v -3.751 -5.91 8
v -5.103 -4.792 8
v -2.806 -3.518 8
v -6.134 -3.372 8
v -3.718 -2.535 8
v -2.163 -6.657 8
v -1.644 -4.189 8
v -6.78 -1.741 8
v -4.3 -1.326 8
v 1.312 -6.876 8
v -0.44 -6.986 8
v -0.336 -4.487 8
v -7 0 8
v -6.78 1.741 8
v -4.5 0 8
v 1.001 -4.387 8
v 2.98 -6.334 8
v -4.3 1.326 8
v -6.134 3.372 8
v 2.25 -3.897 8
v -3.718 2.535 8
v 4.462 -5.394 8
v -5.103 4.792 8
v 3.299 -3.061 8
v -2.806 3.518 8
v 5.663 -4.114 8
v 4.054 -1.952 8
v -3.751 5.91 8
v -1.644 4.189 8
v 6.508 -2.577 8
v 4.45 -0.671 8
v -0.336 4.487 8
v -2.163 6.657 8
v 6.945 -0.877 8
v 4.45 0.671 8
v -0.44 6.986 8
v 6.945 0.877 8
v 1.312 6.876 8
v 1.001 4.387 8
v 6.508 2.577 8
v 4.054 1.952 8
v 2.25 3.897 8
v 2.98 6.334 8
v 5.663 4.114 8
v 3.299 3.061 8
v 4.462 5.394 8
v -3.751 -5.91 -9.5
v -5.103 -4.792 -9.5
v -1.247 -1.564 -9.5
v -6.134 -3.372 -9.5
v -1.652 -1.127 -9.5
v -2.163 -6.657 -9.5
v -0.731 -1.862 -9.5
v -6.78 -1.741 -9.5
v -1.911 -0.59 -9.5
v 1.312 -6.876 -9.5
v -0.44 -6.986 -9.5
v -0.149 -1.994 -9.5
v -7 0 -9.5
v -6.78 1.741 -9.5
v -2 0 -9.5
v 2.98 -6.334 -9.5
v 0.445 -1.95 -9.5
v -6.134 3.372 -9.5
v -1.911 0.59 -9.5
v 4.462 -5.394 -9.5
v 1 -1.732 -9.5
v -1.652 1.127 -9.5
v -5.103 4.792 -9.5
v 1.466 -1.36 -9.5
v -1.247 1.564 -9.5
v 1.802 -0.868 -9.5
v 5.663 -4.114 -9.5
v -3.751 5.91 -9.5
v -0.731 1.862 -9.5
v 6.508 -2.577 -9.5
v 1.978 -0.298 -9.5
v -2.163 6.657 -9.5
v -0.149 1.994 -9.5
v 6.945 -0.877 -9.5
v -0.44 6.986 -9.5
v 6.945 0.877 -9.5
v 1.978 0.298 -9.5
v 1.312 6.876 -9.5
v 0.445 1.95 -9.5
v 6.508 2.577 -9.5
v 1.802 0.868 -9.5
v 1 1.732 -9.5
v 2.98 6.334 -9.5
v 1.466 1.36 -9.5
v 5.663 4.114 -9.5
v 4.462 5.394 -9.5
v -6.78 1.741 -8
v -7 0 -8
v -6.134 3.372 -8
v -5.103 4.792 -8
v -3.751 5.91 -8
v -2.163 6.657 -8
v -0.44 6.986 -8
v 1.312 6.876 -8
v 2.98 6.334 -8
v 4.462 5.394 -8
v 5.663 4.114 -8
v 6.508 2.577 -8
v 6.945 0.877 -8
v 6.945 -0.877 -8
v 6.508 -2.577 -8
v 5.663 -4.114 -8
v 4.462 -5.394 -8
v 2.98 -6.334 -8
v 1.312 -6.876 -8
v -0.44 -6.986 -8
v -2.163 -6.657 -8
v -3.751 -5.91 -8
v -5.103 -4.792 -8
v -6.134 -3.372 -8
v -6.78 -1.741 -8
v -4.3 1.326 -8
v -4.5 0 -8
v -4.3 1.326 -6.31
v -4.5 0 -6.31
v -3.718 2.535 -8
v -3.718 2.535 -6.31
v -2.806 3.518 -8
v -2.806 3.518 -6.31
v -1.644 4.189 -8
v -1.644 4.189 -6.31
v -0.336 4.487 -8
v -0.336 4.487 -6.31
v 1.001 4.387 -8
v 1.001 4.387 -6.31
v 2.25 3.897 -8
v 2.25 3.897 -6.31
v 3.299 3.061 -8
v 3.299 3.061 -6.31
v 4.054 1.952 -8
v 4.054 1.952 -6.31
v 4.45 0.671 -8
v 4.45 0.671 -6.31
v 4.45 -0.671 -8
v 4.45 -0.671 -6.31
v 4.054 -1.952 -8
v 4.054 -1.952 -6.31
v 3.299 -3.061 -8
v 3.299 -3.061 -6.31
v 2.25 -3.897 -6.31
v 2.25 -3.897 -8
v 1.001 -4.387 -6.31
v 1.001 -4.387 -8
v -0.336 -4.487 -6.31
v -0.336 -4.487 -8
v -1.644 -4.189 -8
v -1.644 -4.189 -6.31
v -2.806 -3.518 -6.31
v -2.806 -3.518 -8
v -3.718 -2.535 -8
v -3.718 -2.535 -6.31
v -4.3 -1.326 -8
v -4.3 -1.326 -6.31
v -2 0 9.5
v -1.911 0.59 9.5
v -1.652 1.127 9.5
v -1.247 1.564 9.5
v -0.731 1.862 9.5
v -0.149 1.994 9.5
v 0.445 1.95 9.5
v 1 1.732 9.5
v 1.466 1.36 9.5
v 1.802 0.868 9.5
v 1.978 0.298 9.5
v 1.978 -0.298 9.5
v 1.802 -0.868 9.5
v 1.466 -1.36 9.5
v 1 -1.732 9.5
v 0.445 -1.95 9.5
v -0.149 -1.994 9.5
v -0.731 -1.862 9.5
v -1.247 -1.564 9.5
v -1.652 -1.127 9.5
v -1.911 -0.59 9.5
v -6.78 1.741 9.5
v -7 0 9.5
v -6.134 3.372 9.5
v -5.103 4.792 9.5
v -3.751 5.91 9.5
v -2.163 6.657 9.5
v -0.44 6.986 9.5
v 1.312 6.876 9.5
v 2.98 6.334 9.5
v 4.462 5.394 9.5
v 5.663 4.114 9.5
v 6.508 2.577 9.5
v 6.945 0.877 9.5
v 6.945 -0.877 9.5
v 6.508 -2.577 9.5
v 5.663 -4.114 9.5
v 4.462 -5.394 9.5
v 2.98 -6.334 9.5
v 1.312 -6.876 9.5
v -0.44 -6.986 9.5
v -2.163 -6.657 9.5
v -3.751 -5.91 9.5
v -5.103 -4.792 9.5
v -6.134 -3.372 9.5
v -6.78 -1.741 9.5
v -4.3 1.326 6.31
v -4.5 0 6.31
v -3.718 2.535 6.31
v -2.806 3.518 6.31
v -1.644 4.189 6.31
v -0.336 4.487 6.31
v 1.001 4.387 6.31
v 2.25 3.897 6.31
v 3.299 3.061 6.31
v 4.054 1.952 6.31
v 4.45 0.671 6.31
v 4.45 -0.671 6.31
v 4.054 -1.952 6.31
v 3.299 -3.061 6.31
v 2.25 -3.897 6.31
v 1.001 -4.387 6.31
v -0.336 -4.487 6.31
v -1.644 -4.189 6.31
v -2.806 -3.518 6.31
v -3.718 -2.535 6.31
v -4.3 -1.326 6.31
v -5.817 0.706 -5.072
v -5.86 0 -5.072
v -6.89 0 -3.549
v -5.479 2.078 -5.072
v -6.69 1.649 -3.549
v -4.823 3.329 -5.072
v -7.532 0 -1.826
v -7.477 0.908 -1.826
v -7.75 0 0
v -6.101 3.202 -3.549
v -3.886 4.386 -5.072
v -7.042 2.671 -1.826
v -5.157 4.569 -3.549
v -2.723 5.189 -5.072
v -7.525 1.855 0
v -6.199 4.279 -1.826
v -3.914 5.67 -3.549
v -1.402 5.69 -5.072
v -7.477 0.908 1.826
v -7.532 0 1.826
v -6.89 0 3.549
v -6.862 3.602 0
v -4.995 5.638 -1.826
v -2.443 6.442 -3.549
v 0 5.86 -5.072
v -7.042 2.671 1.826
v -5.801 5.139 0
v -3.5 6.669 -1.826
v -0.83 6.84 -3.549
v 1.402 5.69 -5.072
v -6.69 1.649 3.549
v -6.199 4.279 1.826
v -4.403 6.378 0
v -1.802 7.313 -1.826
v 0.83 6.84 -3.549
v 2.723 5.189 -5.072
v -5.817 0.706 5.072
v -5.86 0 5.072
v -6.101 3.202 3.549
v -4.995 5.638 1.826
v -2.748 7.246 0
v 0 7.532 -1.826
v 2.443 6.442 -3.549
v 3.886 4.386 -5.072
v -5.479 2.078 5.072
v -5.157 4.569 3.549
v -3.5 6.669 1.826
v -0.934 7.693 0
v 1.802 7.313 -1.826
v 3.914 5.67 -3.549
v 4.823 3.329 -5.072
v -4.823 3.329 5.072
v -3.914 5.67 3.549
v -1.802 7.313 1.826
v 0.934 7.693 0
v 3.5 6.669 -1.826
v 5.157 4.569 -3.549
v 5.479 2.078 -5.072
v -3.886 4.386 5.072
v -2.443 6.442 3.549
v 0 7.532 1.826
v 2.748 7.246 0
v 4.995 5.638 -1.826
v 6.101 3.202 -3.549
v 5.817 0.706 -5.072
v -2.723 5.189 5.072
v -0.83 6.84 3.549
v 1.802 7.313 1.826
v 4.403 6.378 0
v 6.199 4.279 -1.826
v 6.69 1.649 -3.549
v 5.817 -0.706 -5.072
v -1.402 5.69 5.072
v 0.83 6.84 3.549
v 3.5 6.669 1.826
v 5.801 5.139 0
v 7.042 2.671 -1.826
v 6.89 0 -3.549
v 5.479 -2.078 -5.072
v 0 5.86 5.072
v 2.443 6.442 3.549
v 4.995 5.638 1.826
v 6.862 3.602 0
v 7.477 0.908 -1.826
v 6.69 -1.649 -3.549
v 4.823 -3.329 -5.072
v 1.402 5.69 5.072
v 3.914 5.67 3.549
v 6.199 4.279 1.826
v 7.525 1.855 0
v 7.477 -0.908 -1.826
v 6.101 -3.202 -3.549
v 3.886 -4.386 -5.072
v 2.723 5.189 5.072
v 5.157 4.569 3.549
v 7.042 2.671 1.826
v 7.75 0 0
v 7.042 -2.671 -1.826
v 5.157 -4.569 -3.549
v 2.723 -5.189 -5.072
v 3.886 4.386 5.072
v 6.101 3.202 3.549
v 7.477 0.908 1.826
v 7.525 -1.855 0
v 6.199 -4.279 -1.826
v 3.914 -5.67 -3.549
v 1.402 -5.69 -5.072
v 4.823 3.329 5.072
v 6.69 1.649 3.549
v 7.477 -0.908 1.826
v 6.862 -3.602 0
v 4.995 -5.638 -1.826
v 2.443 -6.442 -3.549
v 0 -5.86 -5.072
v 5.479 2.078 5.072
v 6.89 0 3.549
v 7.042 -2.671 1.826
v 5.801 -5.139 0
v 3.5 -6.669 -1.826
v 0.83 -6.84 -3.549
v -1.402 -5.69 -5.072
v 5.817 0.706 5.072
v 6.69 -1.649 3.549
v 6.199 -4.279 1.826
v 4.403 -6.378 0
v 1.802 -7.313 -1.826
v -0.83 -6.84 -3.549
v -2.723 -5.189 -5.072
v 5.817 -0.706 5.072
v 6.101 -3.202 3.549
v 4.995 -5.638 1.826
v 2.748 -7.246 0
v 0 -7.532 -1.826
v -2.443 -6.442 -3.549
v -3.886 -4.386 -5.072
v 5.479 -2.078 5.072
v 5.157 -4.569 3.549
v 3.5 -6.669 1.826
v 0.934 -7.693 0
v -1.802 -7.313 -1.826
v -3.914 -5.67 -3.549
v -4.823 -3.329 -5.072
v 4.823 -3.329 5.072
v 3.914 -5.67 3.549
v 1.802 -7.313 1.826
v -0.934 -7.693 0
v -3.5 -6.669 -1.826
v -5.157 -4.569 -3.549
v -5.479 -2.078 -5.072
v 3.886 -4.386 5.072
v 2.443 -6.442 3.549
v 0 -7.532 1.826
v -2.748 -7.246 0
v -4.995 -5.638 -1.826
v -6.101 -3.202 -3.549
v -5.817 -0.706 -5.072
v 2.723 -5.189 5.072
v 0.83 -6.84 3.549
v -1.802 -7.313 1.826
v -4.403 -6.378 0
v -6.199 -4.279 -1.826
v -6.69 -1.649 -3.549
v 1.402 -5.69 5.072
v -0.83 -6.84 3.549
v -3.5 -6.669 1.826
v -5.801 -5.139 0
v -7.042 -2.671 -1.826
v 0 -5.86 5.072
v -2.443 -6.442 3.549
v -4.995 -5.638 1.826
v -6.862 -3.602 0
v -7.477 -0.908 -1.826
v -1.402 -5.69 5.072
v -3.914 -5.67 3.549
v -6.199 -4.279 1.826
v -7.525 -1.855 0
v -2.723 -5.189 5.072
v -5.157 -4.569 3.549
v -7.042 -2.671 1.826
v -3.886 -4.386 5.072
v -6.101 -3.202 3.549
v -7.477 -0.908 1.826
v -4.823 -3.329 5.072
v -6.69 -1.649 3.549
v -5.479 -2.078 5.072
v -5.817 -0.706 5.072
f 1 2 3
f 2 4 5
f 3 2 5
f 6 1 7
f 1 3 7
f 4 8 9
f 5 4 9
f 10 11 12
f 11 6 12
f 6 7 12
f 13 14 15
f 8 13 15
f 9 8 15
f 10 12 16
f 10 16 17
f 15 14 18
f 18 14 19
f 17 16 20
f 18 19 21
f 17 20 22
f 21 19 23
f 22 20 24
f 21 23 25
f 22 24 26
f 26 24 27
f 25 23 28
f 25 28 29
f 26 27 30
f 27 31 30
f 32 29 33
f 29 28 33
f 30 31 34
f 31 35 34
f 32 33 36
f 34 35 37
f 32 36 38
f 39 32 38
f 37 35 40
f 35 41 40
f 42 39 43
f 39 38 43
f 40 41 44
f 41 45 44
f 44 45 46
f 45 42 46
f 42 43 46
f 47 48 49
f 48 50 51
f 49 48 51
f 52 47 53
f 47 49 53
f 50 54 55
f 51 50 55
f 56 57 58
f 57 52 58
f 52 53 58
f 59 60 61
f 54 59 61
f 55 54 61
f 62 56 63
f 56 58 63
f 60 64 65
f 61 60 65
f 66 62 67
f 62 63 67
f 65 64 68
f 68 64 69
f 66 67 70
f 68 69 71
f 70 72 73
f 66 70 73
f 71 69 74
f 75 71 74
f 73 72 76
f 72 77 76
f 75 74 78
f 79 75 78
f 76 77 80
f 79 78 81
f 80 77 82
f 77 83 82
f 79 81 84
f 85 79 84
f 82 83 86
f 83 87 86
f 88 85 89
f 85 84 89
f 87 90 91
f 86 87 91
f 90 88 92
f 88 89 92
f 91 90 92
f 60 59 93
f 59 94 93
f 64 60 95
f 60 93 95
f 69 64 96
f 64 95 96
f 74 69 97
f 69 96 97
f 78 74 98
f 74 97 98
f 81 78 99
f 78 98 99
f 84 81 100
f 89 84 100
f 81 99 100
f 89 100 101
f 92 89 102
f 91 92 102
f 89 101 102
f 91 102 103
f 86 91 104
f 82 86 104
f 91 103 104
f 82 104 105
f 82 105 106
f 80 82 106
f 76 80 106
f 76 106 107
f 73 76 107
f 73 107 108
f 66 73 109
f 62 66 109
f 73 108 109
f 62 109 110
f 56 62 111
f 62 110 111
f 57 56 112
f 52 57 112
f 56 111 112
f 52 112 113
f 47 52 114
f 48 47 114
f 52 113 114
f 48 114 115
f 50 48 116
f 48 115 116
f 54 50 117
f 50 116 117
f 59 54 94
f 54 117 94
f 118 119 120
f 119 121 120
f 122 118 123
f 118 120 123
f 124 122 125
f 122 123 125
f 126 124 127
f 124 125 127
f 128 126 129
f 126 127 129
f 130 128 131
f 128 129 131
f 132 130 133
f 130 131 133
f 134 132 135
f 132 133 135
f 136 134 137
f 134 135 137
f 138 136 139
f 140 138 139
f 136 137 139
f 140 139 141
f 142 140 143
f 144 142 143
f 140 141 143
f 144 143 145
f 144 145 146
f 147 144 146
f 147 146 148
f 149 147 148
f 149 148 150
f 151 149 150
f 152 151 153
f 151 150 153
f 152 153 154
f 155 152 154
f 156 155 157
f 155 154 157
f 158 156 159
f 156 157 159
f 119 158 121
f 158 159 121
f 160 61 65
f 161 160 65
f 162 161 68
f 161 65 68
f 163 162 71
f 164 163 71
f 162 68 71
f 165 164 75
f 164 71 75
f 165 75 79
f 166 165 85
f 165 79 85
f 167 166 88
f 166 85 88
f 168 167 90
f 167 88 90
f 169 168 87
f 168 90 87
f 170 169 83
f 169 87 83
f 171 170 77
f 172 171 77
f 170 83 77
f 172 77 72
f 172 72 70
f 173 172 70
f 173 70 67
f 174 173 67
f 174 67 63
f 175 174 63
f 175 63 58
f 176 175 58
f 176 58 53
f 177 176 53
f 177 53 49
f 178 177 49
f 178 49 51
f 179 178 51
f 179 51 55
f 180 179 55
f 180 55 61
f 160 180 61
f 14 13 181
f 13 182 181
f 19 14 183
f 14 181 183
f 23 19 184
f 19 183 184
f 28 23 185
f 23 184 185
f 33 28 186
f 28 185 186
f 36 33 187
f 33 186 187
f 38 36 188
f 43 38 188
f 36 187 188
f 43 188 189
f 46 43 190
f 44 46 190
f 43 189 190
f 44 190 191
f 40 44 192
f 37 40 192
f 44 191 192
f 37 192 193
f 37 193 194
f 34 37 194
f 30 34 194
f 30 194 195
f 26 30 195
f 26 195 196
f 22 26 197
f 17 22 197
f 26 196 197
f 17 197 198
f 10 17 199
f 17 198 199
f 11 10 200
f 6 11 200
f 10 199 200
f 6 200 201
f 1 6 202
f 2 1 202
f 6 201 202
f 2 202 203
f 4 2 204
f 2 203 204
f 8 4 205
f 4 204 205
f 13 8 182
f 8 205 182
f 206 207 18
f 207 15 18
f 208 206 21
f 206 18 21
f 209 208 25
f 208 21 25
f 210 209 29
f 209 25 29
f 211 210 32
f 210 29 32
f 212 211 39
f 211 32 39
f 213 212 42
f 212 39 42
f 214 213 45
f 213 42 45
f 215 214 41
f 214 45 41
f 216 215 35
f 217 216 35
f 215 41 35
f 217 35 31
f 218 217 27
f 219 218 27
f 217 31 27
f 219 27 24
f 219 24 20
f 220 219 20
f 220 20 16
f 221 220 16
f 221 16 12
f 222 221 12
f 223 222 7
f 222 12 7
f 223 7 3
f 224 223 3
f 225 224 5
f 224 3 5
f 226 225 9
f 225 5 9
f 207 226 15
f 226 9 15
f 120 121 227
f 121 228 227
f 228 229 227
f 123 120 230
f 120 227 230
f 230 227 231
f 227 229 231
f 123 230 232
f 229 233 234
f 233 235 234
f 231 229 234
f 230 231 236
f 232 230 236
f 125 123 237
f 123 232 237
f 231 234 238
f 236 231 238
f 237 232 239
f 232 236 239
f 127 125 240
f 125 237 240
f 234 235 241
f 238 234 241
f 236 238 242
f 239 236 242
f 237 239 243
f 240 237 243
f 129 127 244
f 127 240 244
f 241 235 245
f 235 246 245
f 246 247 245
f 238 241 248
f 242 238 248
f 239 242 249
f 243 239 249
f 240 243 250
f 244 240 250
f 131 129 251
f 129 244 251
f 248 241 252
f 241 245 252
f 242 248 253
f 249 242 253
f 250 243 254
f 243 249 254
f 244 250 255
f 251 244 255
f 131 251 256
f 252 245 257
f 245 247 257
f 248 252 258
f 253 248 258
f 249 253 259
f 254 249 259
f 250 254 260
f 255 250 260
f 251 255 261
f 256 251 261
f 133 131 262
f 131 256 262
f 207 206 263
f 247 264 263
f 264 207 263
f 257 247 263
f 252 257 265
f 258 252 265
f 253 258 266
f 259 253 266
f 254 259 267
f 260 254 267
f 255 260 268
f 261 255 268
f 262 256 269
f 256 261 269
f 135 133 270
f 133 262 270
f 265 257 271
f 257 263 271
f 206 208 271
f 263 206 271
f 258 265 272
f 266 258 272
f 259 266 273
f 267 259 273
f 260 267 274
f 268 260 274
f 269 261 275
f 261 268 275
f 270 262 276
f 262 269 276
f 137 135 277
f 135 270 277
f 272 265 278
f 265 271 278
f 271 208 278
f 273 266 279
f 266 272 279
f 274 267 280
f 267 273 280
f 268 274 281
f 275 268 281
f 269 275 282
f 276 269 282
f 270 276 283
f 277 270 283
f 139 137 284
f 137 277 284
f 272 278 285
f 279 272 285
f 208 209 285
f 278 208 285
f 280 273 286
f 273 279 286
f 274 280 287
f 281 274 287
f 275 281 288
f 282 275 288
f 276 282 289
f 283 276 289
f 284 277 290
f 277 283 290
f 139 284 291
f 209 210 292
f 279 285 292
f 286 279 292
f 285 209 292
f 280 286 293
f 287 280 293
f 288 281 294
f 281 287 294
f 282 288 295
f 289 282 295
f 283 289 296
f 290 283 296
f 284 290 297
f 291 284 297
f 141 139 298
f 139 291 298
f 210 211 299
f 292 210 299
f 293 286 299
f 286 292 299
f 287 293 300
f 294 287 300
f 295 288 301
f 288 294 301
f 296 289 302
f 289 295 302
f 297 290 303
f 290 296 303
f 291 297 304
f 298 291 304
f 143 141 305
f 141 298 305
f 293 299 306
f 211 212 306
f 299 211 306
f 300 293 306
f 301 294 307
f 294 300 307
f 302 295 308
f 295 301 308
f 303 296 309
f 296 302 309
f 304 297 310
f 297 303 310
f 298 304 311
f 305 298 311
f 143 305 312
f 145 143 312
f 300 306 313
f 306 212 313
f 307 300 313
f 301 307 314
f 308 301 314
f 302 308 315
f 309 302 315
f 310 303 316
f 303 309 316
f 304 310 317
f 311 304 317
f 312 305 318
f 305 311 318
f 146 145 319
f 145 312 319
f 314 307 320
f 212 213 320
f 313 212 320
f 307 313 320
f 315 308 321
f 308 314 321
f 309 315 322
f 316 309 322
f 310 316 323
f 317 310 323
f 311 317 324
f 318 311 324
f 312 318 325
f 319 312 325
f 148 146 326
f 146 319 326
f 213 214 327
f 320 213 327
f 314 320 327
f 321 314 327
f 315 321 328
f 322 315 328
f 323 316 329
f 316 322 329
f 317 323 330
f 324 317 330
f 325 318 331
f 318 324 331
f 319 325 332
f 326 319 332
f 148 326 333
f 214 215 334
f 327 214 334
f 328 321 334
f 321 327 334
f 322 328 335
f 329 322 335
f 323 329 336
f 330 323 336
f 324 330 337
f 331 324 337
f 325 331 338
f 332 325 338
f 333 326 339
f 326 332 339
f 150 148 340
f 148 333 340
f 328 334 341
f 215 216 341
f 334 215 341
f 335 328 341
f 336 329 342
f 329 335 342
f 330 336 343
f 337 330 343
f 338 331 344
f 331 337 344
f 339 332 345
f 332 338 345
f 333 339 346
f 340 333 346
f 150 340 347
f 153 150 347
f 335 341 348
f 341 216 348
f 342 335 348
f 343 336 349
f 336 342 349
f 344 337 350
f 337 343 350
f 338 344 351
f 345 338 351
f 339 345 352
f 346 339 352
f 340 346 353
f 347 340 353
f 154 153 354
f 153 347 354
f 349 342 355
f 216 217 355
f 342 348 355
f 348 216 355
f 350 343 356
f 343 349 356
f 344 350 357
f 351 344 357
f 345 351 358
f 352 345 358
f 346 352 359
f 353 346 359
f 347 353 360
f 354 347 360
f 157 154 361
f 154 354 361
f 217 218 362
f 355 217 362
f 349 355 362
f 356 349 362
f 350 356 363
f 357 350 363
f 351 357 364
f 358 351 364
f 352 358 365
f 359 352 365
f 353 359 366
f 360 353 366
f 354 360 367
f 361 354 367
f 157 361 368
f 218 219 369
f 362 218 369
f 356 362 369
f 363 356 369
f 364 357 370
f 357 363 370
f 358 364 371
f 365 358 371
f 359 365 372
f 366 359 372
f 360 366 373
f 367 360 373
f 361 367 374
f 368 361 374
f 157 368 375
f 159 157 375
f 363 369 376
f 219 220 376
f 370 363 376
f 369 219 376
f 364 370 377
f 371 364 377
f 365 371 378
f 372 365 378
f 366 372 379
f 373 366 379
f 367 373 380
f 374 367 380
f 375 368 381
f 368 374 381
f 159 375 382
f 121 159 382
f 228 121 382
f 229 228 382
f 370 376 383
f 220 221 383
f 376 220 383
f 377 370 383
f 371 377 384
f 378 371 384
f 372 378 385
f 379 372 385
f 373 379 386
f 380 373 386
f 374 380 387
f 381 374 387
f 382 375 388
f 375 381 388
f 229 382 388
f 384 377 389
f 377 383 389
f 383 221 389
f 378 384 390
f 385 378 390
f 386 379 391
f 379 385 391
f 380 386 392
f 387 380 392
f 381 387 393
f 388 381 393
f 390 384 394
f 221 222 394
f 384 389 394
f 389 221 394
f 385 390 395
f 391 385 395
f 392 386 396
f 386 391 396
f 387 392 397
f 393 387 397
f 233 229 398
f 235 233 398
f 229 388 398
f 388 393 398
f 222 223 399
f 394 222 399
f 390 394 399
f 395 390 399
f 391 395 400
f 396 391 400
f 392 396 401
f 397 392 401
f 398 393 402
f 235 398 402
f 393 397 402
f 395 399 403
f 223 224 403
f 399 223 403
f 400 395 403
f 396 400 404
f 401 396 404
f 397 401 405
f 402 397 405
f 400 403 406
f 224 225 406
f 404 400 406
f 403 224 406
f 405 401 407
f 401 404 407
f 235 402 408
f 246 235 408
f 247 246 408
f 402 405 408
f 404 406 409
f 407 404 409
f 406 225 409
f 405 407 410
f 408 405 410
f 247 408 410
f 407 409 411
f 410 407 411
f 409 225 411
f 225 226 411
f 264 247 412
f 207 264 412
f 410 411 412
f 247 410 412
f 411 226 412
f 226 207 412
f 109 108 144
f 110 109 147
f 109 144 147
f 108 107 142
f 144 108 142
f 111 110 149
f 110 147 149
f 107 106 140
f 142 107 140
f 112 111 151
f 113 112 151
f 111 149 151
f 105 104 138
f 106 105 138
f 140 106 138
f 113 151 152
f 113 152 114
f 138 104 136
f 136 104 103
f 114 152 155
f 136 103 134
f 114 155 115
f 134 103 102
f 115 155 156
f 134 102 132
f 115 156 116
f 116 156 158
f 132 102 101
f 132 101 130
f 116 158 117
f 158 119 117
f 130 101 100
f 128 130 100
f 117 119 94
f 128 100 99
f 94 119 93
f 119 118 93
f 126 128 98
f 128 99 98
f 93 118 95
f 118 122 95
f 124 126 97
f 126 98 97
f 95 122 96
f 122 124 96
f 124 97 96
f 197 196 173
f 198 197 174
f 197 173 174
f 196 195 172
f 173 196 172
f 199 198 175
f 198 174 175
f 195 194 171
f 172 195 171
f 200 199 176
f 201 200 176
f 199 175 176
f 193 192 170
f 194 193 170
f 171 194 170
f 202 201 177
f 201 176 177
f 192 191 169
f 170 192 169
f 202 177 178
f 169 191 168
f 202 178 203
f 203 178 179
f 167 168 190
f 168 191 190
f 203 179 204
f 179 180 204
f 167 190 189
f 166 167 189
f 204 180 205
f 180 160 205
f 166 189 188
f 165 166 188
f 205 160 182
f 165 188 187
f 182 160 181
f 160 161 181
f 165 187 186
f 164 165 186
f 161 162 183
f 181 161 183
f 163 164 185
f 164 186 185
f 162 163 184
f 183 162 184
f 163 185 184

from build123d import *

# Parameters (mm, degrees)
F_4_0_4_DIAMETER_HOLE1_D = 4


with BuildPart() as part:
    # Sketch1 → Revolve1 (revolve)
    with BuildSketch(Plane(origin=(0, 0, 0), x_dir=(1, 0, 0), z_dir=(0, 1, 0))):
        with BuildLine():
            Line((-4.5, -6.309714732), (-4.5, -8))
            Line((-4.5, -8), (-7, -8))
            Line((-7, -8), (-7, -9.5))
            Line((-7, -9.5), (0, -9.5))
            Line((0, -9.5), (0, 9.5))
            Line((0, 9.5), (-7, 9.5))
            Line((-7, 9.5), (-7, 8))
            Line((-7, 8), (-4.5, 8))
            Line((-4.5, 8), (-4.5, 6.309714732))
            ThreePointArc((-4.5, 6.309714732), (-7.75, 0), (-4.5, -6.309714732))
        make_face()
    revolve(axis=Axis((0, 0, 9.5), (0, 0, -1)))

    # Ø4.0 (4) Diameter Hole1 (through all)
    with Locations(Plane.XY.offset(9.5)):
        with Locations((0, 0)):
            Hole(F_4_0_4_DIAMETER_HOLE1_D / 2)


solid = part.part
